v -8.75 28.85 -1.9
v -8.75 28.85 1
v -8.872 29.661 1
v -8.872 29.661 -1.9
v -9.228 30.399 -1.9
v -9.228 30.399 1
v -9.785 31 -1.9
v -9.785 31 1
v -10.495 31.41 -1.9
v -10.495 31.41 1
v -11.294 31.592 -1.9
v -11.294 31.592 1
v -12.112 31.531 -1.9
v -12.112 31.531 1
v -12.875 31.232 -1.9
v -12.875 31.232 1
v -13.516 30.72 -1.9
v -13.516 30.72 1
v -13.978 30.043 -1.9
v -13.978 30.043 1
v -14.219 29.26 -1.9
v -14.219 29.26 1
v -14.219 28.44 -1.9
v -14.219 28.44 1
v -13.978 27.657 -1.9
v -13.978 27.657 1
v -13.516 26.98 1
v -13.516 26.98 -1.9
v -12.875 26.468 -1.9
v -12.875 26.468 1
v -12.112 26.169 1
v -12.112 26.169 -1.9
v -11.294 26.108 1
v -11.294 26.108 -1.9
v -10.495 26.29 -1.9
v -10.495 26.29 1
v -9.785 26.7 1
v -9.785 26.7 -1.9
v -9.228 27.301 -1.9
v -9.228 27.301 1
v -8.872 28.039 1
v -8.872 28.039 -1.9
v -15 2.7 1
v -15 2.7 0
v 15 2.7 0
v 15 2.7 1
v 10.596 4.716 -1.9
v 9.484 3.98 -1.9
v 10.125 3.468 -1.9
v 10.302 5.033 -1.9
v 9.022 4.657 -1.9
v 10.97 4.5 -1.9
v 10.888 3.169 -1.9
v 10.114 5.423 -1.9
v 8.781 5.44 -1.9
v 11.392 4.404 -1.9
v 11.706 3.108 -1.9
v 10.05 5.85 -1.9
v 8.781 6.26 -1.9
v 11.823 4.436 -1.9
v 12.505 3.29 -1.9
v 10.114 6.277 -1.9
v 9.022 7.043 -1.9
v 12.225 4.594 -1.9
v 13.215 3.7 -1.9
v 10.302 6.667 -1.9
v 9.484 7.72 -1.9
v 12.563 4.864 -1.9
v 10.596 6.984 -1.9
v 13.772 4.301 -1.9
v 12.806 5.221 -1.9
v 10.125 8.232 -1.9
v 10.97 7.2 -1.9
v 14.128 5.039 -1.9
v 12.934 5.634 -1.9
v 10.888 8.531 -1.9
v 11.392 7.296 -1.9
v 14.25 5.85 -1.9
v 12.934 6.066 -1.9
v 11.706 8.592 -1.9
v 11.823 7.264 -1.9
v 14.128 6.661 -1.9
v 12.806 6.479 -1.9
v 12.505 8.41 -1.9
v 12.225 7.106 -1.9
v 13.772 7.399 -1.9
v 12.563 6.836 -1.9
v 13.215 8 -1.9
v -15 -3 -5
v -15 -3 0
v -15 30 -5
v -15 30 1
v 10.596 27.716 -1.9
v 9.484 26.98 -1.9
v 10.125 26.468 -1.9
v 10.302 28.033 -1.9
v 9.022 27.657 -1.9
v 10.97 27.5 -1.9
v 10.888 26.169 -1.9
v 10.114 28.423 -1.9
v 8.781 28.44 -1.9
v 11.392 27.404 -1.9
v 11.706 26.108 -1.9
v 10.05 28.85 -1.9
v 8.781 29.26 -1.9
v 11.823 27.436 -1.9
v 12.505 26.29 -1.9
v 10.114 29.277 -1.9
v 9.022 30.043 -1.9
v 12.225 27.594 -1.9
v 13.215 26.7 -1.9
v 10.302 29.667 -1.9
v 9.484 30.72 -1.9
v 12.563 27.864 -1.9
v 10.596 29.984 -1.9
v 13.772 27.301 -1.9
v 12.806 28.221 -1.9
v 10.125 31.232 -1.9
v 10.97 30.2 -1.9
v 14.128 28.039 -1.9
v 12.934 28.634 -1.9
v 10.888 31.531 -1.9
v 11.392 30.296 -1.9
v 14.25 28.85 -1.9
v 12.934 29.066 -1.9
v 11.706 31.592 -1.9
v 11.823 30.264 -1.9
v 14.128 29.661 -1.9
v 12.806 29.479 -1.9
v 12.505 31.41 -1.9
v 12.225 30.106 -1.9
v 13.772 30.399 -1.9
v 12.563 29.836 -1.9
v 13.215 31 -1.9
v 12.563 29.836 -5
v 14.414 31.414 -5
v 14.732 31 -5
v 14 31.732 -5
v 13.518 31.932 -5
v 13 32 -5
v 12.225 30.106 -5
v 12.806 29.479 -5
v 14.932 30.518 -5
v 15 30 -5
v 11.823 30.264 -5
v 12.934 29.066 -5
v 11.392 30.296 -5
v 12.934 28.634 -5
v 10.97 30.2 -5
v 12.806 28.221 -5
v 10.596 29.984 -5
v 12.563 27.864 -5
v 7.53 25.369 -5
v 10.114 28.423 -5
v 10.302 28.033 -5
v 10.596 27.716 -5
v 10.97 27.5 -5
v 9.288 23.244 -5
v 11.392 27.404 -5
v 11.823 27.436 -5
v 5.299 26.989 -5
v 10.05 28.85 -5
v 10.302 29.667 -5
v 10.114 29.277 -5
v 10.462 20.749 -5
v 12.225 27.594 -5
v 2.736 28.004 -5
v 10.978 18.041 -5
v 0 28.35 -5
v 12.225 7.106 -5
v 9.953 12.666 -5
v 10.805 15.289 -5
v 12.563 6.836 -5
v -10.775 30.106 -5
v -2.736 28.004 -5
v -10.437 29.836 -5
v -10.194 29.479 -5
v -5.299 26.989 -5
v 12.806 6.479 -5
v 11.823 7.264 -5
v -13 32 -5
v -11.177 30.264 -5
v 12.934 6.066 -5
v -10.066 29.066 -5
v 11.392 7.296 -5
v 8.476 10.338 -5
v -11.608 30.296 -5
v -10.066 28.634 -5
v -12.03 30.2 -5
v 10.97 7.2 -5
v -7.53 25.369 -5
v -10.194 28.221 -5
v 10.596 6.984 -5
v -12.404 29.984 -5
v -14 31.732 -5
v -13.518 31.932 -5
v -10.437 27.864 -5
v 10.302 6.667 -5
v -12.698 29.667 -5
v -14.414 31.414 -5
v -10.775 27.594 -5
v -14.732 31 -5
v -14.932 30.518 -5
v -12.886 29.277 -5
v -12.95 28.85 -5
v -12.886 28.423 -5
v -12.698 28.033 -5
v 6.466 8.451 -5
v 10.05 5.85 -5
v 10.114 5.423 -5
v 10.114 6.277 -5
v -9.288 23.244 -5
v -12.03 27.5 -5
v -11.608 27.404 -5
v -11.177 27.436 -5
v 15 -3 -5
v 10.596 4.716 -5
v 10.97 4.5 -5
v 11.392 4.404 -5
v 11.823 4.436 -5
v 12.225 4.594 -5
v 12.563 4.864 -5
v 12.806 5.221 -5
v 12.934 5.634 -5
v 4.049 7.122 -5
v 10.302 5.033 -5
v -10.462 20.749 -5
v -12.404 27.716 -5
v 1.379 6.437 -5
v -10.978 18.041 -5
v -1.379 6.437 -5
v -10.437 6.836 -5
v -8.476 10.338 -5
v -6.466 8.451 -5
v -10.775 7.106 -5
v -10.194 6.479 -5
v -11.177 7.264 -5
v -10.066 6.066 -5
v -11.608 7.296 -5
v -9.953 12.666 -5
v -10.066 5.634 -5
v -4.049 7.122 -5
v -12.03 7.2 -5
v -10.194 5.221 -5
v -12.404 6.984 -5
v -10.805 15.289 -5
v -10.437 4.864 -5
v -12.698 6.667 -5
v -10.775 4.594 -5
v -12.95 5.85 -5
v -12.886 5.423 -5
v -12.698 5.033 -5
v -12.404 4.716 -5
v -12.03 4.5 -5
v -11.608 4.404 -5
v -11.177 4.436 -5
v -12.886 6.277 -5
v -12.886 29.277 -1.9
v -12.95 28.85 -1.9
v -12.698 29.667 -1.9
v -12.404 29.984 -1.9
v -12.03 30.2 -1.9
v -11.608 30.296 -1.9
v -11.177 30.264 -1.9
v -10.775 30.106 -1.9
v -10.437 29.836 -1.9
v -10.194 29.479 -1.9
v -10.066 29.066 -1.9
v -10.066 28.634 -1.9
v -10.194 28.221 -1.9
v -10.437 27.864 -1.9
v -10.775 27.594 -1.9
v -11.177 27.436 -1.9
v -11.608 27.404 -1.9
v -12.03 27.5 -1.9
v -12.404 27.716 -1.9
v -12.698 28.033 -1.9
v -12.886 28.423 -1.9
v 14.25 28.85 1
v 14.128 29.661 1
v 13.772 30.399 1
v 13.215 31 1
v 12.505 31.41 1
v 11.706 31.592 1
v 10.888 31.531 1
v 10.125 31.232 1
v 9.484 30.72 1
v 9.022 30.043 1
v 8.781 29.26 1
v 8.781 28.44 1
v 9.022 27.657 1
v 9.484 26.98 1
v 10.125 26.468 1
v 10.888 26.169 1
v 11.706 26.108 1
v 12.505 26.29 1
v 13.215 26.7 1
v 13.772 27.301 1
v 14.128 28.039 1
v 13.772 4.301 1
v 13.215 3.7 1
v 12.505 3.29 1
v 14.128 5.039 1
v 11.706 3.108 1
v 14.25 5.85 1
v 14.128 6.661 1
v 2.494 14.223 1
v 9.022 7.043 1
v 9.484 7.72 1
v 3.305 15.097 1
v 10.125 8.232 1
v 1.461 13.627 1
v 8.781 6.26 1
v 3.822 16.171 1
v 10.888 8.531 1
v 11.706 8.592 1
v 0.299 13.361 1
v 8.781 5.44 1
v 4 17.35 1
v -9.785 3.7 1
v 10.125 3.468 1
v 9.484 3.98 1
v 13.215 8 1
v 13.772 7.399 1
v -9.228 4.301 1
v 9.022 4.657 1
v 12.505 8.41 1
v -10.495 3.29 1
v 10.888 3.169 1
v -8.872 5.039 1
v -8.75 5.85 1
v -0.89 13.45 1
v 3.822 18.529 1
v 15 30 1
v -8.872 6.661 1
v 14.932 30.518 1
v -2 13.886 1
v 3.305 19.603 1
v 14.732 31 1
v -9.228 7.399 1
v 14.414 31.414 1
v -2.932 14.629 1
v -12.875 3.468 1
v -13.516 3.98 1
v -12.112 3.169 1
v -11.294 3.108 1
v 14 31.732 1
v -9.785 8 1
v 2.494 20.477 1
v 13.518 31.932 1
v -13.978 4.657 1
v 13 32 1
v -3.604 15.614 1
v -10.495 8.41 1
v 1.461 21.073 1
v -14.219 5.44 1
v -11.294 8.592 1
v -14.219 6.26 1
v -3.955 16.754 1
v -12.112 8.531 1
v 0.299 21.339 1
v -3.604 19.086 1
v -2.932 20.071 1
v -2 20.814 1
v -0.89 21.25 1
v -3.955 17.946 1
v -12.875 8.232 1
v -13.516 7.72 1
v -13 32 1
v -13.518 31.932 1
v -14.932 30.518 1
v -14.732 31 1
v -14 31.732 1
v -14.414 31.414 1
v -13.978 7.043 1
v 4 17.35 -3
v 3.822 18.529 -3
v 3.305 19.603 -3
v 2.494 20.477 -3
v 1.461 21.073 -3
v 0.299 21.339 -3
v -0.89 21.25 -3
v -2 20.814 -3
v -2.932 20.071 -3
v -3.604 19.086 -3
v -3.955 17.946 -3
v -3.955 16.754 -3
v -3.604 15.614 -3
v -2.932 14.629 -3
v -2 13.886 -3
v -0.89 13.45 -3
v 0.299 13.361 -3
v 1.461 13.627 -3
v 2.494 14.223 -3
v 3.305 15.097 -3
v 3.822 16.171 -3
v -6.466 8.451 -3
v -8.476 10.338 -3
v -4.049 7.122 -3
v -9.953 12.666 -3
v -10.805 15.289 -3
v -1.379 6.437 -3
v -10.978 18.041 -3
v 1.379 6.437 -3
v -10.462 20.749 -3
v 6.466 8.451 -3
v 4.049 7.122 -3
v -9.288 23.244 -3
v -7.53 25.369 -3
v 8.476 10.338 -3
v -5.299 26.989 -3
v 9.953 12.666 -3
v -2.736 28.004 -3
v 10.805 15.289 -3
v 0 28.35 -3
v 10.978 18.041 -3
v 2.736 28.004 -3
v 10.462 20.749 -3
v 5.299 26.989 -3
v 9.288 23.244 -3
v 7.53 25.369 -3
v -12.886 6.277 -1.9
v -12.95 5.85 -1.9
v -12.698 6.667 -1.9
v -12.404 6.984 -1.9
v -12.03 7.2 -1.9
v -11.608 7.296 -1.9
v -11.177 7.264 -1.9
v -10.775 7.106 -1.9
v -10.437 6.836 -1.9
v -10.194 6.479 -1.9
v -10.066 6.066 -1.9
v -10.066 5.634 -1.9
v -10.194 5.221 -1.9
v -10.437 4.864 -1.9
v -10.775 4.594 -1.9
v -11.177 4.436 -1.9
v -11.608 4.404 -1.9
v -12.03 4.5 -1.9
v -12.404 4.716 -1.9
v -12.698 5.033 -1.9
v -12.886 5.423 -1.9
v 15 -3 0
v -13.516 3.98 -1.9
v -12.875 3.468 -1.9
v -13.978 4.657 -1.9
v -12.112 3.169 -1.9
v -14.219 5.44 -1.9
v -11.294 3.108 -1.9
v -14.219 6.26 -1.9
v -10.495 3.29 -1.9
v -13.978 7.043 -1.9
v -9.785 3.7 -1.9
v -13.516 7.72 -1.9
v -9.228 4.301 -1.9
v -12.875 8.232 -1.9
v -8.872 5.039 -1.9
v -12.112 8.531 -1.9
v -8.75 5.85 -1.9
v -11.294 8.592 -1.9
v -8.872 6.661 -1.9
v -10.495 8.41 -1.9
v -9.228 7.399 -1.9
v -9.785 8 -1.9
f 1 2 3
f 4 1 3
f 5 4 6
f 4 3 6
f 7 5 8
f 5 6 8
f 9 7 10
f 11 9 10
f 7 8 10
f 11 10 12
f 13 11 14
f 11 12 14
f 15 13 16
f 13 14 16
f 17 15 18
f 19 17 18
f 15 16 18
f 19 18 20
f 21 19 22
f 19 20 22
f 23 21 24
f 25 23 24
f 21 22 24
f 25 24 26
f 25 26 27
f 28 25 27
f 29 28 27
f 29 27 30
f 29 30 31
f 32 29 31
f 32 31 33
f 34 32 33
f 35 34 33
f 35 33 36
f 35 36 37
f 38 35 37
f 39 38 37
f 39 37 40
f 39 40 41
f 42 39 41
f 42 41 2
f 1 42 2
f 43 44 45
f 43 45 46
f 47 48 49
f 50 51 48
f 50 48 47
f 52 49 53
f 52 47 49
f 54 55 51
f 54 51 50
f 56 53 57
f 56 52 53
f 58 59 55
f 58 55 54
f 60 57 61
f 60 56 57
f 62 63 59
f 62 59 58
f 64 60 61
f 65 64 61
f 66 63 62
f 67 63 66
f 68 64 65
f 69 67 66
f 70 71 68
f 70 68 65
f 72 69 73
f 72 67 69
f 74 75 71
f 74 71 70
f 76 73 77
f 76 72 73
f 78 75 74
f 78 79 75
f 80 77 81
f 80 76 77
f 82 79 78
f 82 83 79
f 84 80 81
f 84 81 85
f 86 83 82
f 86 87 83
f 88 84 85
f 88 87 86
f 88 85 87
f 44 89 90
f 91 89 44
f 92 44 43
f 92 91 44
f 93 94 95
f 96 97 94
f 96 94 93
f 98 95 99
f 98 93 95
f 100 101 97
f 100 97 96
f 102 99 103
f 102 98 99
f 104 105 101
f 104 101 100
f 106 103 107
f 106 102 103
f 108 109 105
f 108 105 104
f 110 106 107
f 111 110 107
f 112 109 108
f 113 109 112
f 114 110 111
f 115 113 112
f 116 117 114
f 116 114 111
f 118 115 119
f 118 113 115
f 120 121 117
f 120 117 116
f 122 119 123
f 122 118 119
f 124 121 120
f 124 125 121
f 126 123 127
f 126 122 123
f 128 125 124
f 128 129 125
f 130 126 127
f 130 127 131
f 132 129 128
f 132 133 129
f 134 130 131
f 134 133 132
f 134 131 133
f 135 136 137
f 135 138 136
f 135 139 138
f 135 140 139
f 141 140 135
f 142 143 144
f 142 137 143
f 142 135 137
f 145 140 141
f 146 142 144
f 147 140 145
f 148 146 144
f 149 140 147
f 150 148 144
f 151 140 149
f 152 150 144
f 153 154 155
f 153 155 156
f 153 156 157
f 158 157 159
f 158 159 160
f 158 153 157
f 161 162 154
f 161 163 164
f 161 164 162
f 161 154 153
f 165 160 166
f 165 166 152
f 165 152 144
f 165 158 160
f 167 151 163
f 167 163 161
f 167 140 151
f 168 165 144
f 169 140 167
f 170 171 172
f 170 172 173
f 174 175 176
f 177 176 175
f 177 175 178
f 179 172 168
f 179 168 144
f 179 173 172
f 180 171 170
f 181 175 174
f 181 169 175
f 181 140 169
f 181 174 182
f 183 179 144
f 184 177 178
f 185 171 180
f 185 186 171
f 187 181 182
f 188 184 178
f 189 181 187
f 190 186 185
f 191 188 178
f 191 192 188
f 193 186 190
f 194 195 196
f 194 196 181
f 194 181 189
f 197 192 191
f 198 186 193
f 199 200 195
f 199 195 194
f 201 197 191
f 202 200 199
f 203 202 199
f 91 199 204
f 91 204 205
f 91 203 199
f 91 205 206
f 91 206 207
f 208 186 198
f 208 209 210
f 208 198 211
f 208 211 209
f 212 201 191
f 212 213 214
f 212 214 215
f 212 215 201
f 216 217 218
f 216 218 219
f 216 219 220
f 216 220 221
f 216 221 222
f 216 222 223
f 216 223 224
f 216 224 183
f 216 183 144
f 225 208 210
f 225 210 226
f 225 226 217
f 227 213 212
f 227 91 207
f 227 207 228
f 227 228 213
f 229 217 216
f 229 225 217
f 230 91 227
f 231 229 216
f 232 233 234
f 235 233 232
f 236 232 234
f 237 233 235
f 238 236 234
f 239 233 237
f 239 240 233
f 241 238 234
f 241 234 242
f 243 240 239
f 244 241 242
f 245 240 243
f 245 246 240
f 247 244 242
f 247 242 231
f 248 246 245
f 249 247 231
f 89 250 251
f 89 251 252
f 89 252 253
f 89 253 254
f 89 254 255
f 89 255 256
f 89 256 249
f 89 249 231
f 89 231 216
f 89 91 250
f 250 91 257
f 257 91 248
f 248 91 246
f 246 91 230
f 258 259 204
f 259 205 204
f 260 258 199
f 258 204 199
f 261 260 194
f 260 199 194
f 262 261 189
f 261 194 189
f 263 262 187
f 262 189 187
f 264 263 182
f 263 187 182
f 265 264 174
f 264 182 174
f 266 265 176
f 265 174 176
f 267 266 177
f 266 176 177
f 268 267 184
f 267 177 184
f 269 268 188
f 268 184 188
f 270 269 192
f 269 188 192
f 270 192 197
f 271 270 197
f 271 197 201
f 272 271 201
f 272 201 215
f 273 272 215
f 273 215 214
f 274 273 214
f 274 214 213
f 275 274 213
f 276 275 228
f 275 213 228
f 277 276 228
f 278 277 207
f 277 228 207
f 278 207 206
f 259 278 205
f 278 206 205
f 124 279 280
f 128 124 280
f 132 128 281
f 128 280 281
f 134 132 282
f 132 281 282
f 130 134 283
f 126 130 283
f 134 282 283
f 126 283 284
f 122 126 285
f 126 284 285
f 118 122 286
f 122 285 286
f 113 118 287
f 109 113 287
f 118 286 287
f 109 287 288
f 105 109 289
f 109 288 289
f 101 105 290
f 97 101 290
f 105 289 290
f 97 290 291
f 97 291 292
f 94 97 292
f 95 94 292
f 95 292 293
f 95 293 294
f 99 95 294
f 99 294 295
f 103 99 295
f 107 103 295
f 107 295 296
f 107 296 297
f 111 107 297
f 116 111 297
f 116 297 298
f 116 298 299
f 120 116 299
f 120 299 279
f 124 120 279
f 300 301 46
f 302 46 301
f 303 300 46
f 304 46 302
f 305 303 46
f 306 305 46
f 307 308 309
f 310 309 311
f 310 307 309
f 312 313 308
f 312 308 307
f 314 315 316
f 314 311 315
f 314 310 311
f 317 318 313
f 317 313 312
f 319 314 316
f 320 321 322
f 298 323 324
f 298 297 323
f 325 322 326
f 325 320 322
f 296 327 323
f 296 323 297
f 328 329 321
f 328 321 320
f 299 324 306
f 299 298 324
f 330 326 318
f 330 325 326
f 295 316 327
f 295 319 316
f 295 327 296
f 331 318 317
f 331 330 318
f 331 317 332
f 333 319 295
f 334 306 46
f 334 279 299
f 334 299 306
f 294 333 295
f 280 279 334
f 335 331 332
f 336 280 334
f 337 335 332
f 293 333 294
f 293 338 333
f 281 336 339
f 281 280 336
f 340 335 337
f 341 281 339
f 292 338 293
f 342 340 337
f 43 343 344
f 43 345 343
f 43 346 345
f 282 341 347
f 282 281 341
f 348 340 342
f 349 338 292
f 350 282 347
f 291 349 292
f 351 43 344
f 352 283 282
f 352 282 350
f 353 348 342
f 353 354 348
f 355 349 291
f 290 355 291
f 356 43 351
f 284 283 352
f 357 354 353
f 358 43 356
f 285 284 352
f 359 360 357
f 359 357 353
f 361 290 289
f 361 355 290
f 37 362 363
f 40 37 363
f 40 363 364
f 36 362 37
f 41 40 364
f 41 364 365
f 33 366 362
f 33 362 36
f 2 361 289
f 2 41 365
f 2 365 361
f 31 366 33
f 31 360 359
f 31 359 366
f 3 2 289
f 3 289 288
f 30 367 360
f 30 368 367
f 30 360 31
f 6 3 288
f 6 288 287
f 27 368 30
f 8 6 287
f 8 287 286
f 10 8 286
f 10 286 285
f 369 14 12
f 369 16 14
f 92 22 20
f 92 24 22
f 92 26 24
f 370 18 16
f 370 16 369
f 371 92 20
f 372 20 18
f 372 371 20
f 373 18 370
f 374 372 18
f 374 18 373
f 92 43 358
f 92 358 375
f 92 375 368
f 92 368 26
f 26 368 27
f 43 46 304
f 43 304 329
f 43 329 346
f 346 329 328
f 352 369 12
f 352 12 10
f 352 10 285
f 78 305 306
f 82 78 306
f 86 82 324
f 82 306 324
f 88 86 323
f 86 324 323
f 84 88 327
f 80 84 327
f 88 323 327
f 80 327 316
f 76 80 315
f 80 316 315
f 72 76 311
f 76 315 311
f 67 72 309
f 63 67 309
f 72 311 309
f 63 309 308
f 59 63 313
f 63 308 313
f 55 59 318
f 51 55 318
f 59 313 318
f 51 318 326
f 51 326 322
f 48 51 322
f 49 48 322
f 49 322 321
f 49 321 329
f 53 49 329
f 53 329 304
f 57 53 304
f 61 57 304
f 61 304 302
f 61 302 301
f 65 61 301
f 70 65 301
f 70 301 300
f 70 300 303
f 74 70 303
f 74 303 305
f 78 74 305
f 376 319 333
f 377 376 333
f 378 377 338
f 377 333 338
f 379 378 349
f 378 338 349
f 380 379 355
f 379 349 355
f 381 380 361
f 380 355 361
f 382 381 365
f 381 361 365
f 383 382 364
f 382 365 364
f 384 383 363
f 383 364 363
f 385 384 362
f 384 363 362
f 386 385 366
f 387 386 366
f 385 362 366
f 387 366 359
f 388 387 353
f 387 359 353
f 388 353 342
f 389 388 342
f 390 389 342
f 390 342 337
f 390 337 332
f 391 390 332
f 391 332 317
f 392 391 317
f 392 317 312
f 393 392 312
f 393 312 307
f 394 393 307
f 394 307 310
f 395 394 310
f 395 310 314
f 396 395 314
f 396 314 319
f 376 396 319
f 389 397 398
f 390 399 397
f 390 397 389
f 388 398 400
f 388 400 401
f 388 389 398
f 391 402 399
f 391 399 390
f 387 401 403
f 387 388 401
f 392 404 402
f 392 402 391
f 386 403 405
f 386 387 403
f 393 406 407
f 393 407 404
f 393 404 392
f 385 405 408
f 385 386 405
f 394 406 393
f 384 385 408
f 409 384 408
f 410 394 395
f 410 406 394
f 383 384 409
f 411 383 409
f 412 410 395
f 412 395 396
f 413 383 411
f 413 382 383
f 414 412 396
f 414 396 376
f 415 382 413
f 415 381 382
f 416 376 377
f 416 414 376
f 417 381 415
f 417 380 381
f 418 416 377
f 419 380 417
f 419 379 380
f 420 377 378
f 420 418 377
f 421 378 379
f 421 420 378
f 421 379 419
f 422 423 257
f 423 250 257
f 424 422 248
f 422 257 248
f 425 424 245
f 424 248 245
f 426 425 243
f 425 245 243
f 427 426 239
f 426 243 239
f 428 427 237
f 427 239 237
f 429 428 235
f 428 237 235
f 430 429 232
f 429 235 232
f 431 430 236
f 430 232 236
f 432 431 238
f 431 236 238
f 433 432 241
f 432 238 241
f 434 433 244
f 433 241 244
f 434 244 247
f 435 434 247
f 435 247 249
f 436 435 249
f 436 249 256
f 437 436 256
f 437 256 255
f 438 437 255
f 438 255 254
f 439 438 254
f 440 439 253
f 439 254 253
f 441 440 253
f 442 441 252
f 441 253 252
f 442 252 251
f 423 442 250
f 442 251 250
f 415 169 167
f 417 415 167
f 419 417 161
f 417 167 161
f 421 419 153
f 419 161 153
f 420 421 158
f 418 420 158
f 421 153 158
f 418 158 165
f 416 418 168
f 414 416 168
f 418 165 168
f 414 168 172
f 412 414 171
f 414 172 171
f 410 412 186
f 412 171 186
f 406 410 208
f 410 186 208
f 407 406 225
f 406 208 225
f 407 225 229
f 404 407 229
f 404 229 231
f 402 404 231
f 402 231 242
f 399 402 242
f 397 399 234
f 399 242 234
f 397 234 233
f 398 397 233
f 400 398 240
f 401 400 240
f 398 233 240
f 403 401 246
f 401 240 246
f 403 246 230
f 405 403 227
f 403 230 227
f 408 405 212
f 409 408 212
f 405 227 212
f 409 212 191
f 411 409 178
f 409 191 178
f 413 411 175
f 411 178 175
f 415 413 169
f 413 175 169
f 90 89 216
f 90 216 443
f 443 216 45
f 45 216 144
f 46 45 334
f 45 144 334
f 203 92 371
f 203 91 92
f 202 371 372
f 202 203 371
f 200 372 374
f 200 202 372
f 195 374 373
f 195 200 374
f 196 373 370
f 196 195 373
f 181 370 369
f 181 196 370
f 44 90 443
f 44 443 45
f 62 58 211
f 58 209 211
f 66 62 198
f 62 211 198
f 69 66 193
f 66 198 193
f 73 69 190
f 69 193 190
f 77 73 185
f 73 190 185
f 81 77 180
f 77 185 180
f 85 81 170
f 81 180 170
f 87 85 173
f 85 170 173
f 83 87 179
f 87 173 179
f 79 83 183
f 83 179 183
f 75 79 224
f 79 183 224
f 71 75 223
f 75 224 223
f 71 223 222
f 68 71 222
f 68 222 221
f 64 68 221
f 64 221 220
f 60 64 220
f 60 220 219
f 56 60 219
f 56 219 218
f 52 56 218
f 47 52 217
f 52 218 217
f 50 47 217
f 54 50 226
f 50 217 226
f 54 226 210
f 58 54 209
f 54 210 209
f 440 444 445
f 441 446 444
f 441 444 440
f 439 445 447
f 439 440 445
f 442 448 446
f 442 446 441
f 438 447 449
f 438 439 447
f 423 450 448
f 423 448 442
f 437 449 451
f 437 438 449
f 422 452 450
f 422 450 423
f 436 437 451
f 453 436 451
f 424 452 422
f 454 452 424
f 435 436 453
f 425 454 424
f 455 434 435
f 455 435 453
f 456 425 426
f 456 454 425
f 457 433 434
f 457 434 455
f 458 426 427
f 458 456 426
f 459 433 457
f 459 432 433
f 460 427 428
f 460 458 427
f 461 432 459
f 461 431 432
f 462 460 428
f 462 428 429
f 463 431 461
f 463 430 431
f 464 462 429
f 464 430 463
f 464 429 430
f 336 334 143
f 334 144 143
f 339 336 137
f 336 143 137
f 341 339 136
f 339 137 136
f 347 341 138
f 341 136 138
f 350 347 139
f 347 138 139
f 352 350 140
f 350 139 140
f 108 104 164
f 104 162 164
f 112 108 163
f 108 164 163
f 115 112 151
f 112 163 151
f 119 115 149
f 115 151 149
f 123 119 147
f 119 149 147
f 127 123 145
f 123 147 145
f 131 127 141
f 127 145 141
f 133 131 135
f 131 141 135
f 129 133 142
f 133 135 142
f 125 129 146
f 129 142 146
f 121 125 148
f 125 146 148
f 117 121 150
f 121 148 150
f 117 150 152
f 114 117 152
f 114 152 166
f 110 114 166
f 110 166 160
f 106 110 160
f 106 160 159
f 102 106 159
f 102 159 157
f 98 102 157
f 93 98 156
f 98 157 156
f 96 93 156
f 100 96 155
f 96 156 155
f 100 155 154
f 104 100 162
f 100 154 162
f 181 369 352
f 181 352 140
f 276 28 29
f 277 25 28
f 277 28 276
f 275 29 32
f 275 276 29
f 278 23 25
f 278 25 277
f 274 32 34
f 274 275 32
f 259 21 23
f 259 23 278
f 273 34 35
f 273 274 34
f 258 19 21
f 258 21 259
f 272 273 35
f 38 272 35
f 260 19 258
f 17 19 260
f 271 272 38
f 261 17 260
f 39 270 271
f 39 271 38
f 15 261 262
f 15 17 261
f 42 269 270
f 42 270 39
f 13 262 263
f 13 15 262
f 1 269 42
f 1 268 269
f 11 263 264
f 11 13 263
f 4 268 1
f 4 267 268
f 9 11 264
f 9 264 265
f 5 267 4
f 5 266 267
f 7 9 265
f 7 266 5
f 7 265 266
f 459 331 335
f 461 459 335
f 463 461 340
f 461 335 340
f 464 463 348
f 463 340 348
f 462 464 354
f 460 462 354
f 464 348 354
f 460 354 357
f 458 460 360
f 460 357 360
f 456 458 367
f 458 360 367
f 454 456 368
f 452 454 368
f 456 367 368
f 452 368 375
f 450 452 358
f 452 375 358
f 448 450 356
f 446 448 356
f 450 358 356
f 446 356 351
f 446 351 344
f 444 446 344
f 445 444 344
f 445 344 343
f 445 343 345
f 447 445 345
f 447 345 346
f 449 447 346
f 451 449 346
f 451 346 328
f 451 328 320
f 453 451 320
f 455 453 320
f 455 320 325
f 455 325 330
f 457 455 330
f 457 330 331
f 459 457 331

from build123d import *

# Parameters (mm, degrees)
BODY_DEPTH               = 30
FIXTURE_M2_5_D           = 2.9
FIXTURE_M2_5_DEPTH       = 6
FIXTURE_M2_5_CBORE_D     = 5.5
FIXTURE_M2_5_CBORE_DEPTH = 2.9
FIXTURE_M2_5_TIP         = 0.871247898
SKETCH_5_R               = 4
CUT_EXTRUDE_1_DEPTH      = 6
SKETCH_6_R               = 11
CUT_EXTRUDE_2_DEPTH      = 2
FILLET_1_R               = 2


with BuildPart() as part:
    # Эскиз1 → Body (new body)
    with BuildSketch(Plane.ZY.offset(15)):
        Polygon((1, 2.7), (1, 32), (-5, 32), (-5, -3), (0, -3), (0, 2.7), align=None)
    extrude(amount=-BODY_DEPTH)

    # Fixture M2.5
    with Locations(Plane(origin=(-11.5, 28.85, 1), x_dir=(1, 0, 0), z_dir=(0, 0, 1))):
        with Locations((0, 0), (23, 0), (23, -23), (0, -23)):
            CounterBoreHole(FIXTURE_M2_5_D / 2, FIXTURE_M2_5_CBORE_D / 2, FIXTURE_M2_5_CBORE_DEPTH, depth=FIXTURE_M2_5_DEPTH)
            with Locations((0, 0, -(FIXTURE_M2_5_DEPTH + FIXTURE_M2_5_TIP / 2))):  # 118° drill point
                Cone(0, FIXTURE_M2_5_D / 2, FIXTURE_M2_5_TIP, mode=Mode.SUBTRACT)

    # Эскиз5 → Вырез-Вытянуть1 (cut)
    with BuildSketch(Plane.XY.offset(1)):
        with Locations((0, 17.35)):
            Circle(SKETCH_5_R)
    extrude(amount=-CUT_EXTRUDE_1_DEPTH, mode=Mode.SUBTRACT)

    # Эскиз6 → Вырез-Вытянуть2 (cut)
    with BuildSketch(Plane(origin=(0, 0, -5), x_dir=(-1, 0, 0), z_dir=(0, 0, -1))):
        with Locations(Location((0, 17.35, 0), (0, 0, 90))):
            Circle(SKETCH_6_R)
    extrude(amount=-CUT_EXTRUDE_2_DEPTH, mode=Mode.SUBTRACT)

    # Скругление1
    fillet_1_edges = [part.edges().sort_by_distance(p)[0] for p in [
        (15, 32, -2),
        (-15, 32, -2),
    ]]
    fillet(fillet_1_edges, radius=FILLET_1_R)


solid = part.part
